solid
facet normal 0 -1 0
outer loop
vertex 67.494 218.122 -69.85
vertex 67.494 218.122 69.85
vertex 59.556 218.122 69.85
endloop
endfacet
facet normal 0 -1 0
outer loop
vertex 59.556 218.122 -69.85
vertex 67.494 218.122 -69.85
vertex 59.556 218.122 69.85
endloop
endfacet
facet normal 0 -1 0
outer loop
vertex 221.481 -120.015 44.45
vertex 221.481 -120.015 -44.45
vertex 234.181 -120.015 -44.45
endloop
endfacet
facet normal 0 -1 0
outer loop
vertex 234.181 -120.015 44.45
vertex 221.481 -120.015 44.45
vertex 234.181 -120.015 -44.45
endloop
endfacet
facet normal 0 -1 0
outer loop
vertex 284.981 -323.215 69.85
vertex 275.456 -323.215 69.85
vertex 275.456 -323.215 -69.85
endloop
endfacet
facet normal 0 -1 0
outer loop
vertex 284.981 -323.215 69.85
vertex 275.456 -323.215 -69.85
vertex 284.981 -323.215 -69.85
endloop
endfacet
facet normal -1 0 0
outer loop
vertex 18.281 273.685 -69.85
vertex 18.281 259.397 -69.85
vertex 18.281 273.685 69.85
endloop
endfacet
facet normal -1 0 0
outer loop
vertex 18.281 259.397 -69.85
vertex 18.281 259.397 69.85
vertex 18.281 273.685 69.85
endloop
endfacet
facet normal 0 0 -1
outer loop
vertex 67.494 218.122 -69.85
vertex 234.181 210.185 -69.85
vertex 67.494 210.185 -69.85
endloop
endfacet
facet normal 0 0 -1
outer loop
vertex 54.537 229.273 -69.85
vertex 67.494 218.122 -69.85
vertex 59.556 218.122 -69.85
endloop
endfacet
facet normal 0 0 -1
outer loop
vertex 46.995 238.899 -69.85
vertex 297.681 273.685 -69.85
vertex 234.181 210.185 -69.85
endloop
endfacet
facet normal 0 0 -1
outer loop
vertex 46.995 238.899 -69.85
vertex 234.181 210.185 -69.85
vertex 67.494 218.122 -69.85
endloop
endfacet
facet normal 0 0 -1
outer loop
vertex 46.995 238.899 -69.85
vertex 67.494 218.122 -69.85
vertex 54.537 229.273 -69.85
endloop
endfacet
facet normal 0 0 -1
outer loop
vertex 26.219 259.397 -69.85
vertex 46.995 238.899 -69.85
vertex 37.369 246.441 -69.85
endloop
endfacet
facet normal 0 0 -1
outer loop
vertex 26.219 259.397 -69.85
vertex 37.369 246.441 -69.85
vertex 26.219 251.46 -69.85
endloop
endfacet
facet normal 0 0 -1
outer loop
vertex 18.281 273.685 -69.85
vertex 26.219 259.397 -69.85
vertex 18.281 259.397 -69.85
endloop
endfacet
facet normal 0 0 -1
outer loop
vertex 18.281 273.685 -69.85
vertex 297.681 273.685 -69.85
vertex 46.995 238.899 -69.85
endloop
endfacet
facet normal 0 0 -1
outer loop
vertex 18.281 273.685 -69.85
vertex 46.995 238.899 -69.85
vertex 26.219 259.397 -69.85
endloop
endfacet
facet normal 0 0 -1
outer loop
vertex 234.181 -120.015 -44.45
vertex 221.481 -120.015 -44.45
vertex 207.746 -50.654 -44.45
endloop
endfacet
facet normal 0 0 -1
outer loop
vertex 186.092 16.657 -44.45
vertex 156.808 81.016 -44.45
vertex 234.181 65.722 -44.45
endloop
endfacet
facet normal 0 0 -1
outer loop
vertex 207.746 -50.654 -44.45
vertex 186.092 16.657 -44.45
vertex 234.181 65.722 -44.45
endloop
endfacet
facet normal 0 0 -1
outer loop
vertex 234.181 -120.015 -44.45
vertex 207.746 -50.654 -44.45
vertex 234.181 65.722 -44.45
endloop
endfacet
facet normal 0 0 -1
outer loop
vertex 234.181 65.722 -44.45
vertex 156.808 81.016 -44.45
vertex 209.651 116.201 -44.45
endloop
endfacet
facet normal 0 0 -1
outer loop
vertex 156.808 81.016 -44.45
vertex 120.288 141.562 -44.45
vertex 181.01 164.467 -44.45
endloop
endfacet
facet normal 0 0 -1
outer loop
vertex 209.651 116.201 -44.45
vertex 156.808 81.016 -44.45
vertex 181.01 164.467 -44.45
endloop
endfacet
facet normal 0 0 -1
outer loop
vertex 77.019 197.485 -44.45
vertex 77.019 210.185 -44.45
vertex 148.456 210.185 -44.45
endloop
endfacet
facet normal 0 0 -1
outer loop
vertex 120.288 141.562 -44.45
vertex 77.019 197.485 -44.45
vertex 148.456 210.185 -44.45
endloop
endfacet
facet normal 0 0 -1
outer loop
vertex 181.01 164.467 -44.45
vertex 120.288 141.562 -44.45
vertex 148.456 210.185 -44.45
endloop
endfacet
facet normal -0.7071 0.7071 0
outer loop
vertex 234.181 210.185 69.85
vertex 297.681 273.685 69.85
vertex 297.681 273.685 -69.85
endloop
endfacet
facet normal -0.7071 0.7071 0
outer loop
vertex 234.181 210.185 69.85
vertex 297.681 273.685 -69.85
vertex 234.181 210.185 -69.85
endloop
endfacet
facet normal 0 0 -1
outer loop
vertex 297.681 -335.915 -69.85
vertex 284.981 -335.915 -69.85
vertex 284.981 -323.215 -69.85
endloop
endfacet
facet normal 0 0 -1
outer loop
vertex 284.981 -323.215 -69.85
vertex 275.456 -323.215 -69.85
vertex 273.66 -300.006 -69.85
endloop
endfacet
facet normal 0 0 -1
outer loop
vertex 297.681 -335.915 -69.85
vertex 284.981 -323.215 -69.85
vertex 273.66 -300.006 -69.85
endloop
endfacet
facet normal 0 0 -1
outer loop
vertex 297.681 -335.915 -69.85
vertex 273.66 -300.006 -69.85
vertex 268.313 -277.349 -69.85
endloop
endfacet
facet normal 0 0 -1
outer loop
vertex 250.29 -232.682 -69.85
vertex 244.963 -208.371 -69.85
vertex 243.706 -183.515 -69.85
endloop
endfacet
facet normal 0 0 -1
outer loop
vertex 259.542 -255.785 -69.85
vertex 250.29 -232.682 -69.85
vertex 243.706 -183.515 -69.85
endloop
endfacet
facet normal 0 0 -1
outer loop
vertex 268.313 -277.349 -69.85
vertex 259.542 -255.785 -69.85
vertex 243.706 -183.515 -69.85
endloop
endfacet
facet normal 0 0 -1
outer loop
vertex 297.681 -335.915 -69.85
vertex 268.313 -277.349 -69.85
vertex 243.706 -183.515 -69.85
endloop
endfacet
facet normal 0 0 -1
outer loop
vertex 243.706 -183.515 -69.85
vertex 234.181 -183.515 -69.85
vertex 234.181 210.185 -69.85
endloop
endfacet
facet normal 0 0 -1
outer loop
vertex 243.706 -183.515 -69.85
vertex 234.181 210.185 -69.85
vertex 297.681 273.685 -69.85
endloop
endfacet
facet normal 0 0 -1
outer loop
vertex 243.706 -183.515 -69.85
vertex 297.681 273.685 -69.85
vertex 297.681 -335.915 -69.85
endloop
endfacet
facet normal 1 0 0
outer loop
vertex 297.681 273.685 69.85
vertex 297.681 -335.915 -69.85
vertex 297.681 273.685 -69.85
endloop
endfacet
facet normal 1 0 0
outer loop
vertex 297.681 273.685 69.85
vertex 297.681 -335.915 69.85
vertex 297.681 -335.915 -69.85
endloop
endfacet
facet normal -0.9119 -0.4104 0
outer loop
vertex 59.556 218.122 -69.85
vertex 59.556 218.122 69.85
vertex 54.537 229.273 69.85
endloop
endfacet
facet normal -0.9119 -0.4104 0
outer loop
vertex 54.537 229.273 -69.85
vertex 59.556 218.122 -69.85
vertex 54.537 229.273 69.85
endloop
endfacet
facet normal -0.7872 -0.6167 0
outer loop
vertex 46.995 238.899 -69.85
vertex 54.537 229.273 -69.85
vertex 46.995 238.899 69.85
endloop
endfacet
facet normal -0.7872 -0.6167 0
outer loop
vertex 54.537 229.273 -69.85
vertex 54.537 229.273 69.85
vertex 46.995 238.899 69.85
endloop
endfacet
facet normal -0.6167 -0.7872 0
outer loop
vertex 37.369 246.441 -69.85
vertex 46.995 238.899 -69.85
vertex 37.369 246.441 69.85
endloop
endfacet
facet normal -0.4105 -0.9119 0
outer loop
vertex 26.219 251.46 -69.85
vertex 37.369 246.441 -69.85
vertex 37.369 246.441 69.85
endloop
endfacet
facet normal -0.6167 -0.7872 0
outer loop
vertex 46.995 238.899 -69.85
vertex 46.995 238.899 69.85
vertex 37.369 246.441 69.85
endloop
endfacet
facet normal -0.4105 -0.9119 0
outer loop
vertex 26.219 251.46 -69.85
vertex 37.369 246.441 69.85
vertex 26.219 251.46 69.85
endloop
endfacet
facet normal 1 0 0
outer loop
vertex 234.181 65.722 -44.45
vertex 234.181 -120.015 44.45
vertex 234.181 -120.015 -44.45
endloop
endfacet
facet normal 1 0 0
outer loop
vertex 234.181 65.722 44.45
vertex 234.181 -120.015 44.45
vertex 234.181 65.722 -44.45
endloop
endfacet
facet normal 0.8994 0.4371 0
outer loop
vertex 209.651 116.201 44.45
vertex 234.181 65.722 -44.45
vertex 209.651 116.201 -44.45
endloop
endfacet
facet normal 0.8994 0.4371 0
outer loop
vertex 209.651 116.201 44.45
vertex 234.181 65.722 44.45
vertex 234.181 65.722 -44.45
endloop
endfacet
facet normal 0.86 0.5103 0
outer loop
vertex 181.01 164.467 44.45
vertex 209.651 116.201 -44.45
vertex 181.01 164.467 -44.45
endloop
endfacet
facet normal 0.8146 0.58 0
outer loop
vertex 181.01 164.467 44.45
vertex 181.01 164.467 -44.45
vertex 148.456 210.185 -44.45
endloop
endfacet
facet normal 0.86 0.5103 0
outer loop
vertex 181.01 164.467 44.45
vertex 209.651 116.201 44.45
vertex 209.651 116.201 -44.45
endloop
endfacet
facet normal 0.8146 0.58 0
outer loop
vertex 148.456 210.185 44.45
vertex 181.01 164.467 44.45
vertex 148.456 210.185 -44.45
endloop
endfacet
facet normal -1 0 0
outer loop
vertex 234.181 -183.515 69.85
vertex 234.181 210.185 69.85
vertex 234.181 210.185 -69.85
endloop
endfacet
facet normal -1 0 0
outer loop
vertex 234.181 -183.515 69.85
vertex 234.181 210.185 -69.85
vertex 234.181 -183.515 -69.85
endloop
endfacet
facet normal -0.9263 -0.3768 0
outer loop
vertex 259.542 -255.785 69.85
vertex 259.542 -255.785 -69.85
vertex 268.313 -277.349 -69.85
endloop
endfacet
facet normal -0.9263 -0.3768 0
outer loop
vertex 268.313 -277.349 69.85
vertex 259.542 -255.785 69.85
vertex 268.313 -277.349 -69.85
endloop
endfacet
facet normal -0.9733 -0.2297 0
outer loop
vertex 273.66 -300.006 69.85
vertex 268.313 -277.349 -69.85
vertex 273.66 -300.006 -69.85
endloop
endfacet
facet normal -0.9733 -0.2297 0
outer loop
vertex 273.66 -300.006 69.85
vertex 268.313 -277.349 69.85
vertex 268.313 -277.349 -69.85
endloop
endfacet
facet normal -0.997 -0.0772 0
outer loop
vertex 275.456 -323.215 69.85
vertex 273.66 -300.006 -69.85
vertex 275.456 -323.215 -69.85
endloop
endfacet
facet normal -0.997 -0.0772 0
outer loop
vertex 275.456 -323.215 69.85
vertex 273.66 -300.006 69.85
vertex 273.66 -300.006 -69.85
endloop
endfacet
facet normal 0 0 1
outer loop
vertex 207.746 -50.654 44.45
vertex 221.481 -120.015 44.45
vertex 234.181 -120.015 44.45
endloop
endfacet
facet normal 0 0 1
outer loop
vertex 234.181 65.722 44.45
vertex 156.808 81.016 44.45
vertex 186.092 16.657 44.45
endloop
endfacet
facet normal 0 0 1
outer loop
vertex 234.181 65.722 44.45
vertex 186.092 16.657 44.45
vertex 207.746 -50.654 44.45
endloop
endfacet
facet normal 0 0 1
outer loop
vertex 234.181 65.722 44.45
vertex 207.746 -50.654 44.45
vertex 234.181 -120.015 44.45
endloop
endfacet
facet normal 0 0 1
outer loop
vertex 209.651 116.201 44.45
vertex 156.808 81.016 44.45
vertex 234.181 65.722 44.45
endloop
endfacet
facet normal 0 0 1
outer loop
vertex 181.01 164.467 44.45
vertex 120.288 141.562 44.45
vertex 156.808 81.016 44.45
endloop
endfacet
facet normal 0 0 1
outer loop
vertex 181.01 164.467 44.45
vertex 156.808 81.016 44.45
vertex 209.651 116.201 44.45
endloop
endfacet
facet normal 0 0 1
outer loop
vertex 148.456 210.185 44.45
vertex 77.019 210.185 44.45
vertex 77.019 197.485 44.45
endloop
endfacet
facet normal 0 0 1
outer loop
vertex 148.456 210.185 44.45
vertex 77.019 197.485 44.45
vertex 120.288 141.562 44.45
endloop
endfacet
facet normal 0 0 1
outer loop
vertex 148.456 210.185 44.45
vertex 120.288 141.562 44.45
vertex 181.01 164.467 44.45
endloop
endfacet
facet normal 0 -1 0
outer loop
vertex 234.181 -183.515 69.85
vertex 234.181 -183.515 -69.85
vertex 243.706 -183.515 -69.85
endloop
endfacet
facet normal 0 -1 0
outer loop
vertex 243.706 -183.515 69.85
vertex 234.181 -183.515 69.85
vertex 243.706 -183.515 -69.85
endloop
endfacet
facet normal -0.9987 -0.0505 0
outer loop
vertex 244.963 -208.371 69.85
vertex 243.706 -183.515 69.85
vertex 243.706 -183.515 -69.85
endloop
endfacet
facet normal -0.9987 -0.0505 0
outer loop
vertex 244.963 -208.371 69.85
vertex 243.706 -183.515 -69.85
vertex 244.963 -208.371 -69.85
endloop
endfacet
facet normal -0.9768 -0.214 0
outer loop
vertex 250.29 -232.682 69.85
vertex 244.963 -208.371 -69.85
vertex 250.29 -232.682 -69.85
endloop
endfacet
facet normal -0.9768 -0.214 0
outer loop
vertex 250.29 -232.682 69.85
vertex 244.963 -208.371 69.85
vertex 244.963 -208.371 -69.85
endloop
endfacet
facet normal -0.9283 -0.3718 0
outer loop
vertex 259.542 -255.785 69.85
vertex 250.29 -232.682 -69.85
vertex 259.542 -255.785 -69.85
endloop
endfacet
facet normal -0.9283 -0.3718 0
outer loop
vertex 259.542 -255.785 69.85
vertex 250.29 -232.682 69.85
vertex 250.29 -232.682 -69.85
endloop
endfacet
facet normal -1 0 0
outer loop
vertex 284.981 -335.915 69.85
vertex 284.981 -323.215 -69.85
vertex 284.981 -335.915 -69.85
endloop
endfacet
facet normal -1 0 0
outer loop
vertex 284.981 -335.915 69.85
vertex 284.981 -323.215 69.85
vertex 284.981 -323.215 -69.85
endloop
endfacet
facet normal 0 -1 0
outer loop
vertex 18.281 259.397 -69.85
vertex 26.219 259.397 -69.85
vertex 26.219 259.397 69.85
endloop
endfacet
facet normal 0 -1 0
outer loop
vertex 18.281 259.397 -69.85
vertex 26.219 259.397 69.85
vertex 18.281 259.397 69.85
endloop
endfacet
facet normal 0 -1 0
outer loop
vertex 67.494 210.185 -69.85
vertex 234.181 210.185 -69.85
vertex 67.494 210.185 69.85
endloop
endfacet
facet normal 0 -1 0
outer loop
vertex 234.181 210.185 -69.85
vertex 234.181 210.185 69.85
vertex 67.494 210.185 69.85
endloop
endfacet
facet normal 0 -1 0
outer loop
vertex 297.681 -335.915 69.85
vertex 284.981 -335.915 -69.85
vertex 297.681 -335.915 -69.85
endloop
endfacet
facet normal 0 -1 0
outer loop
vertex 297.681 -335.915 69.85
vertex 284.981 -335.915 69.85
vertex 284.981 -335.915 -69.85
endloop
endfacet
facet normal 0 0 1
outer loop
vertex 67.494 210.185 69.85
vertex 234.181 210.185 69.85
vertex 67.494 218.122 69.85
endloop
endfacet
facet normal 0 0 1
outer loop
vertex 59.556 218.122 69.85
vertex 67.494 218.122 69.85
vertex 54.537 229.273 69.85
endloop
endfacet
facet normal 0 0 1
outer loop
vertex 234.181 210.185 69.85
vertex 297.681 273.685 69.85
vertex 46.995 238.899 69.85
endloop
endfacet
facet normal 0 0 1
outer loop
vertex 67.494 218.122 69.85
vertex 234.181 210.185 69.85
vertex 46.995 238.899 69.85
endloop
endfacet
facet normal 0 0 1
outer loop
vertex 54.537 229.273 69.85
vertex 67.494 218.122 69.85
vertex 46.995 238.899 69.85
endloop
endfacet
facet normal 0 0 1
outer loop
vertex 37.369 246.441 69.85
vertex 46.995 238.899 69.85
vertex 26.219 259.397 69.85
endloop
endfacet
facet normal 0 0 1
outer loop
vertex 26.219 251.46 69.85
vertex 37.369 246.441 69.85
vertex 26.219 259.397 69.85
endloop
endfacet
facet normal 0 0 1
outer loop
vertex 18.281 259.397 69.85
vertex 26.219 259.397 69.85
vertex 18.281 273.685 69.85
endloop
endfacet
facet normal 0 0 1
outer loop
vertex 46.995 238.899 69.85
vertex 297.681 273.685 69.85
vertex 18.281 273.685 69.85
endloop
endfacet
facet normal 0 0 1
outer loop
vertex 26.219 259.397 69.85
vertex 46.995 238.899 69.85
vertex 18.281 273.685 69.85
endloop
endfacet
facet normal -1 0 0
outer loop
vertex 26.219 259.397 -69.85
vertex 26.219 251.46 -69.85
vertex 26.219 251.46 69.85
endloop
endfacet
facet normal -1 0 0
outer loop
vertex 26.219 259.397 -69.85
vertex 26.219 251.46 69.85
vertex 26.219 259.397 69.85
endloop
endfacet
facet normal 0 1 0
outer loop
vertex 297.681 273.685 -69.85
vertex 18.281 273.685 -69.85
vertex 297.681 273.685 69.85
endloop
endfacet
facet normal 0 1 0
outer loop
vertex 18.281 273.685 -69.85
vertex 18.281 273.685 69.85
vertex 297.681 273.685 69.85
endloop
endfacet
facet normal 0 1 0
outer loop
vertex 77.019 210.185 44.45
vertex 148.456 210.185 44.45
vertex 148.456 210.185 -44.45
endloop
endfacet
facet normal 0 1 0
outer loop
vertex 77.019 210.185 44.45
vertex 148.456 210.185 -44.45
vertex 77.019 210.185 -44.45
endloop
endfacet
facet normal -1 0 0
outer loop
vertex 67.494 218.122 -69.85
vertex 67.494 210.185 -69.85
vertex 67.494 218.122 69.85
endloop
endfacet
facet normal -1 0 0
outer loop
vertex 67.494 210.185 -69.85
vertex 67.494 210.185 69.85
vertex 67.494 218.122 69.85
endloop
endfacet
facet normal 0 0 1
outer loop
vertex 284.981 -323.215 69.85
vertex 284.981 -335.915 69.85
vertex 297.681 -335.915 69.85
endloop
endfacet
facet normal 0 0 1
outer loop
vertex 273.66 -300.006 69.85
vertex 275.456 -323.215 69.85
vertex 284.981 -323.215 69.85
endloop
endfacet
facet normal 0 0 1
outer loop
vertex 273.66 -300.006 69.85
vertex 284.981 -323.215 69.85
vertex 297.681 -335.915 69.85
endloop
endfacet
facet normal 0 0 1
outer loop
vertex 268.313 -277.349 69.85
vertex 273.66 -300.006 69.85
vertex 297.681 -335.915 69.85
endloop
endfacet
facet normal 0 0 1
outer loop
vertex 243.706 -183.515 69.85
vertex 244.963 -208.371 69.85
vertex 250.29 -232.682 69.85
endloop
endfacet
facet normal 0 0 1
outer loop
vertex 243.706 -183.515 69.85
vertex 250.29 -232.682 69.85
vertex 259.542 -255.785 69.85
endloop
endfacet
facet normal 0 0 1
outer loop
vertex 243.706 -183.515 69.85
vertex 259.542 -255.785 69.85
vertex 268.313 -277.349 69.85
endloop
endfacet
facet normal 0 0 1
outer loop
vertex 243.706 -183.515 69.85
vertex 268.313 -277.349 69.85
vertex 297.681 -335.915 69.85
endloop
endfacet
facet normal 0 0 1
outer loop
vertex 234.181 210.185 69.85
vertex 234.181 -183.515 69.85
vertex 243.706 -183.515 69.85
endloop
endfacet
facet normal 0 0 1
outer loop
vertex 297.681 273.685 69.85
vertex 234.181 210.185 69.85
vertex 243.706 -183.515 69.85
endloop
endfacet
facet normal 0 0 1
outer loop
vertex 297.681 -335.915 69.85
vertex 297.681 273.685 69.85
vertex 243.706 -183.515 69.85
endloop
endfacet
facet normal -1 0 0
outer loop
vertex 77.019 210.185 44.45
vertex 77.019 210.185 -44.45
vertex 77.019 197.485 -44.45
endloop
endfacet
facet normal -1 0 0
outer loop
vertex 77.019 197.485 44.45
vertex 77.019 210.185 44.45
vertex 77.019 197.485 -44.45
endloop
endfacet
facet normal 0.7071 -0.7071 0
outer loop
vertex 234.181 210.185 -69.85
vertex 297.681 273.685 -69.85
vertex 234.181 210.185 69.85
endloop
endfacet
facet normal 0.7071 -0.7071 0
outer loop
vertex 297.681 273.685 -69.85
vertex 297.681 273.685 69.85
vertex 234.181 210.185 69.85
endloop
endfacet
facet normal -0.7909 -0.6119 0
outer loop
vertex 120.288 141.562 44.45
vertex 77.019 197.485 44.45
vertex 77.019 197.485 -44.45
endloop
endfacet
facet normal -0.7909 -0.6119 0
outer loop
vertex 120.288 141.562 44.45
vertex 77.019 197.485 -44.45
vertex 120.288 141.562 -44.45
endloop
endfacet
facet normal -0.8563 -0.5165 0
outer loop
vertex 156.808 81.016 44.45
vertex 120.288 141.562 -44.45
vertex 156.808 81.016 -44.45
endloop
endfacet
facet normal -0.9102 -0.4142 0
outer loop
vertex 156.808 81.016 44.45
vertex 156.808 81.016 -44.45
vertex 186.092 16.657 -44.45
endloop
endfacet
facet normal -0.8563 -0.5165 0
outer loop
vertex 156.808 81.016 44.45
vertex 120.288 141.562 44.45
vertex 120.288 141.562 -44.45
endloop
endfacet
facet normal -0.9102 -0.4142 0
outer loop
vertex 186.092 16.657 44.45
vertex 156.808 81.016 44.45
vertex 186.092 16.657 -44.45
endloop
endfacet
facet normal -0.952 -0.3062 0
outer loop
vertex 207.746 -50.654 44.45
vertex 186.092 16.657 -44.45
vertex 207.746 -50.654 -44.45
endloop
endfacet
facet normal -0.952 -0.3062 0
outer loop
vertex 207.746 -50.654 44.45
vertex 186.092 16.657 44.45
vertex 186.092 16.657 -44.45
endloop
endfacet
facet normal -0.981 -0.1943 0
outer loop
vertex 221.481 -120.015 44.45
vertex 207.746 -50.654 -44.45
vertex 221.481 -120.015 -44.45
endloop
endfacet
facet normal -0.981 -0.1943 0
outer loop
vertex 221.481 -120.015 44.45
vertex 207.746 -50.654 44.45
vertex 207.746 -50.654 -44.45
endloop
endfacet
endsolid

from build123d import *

# Parameters (mm, degrees)
BOSS_EXTRUDE1_DEPTH = 69.85
BOSS_EXTRUDE2_DEPTH = 44.45
BOSS_EXTRUDE3_DEPTH = 69.85


with BuildPart() as part:
    # Sketch1 → Boss-Extrude1 (new body, symmetric)
    with BuildSketch(Plane.XY):
        with BuildLine():
            Line((26.218723016, 251.46), (26.218723016, 259.3975))
            Line((26.218723016, 259.3975), (18.281223016, 259.3975))
            Line((18.281223016, 259.3975), (18.281223016, 273.685))
            Line((18.281223016, 273.685), (297.681223016, 273.685))
            Line((297.681223016, 273.685), (234.181223016, 210.185))
            Line((234.181223016, 210.185), (67.493723016, 210.185))
            Line((67.493723016, 210.185), (67.493723016, 218.1225))
            Line((67.493723016, 218.1225), (59.556223016, 218.1225))
            ThreePointArc((59.556223016, 218.1225), (46.995199198, 238.898976183), (26.218723016, 251.46))
        make_face()
    extrude(amount=BOSS_EXTRUDE1_DEPTH, both=True)


with BuildPart() as body_2:
    # Sketch1_3 → Boss-Extrude2 (new body, symmetric)
    with BuildSketch(Plane.XY):
        with BuildLine():
            ThreePointArc((234.181223016, 65.7225), (195.832286344, 140.632128239), (148.456223016, 210.185))
            Line((148.456223016, 210.185), (77.018723016, 210.185))
            Line((77.018723016, 210.185), (77.018723016, 197.485))
            ThreePointArc((77.018723016, 197.485), (172.381558372, 49.259871337), (221.481223016, -120.015))
            Line((221.481223016, -120.015), (234.181223016, -120.015))
            Line((234.181223016, -120.015), (234.181223016, 65.7225))
        make_face()
    extrude(amount=BOSS_EXTRUDE2_DEPTH, both=True)


with BuildPart() as body_3:
    # Sketch1_4 → Boss-Extrude3 (new body, symmetric)
    with BuildSketch(Plane.XY):
        with BuildLine():
            Line((297.681223016, -335.915), (297.681223016, 273.685))
            Line((297.681223016, 273.685), (234.181223016, 210.185))
            Line((234.181223016, 210.185), (234.181223016, -183.515))
            Line((234.181223016, -183.515), (243.706223016, -183.515))
            ThreePointArc((243.706223016, -183.515), (247.123793252, -220.636316239), (259.542371159, -255.785296713))
            ThreePointArc((259.542371159, -255.785296713), (271.423852, -288.573927679), (275.456223016, -323.215))
            Line((275.456223016, -323.215), (284.981223016, -323.215))
            Line((284.981223016, -323.215), (284.981223016, -335.915))
            Line((284.981223016, -335.915), (297.681223016, -335.915))
        make_face()
    extrude(amount=BOSS_EXTRUDE3_DEPTH, both=True)


solid = Compound([part.part, body_2.part, body_3.part])
